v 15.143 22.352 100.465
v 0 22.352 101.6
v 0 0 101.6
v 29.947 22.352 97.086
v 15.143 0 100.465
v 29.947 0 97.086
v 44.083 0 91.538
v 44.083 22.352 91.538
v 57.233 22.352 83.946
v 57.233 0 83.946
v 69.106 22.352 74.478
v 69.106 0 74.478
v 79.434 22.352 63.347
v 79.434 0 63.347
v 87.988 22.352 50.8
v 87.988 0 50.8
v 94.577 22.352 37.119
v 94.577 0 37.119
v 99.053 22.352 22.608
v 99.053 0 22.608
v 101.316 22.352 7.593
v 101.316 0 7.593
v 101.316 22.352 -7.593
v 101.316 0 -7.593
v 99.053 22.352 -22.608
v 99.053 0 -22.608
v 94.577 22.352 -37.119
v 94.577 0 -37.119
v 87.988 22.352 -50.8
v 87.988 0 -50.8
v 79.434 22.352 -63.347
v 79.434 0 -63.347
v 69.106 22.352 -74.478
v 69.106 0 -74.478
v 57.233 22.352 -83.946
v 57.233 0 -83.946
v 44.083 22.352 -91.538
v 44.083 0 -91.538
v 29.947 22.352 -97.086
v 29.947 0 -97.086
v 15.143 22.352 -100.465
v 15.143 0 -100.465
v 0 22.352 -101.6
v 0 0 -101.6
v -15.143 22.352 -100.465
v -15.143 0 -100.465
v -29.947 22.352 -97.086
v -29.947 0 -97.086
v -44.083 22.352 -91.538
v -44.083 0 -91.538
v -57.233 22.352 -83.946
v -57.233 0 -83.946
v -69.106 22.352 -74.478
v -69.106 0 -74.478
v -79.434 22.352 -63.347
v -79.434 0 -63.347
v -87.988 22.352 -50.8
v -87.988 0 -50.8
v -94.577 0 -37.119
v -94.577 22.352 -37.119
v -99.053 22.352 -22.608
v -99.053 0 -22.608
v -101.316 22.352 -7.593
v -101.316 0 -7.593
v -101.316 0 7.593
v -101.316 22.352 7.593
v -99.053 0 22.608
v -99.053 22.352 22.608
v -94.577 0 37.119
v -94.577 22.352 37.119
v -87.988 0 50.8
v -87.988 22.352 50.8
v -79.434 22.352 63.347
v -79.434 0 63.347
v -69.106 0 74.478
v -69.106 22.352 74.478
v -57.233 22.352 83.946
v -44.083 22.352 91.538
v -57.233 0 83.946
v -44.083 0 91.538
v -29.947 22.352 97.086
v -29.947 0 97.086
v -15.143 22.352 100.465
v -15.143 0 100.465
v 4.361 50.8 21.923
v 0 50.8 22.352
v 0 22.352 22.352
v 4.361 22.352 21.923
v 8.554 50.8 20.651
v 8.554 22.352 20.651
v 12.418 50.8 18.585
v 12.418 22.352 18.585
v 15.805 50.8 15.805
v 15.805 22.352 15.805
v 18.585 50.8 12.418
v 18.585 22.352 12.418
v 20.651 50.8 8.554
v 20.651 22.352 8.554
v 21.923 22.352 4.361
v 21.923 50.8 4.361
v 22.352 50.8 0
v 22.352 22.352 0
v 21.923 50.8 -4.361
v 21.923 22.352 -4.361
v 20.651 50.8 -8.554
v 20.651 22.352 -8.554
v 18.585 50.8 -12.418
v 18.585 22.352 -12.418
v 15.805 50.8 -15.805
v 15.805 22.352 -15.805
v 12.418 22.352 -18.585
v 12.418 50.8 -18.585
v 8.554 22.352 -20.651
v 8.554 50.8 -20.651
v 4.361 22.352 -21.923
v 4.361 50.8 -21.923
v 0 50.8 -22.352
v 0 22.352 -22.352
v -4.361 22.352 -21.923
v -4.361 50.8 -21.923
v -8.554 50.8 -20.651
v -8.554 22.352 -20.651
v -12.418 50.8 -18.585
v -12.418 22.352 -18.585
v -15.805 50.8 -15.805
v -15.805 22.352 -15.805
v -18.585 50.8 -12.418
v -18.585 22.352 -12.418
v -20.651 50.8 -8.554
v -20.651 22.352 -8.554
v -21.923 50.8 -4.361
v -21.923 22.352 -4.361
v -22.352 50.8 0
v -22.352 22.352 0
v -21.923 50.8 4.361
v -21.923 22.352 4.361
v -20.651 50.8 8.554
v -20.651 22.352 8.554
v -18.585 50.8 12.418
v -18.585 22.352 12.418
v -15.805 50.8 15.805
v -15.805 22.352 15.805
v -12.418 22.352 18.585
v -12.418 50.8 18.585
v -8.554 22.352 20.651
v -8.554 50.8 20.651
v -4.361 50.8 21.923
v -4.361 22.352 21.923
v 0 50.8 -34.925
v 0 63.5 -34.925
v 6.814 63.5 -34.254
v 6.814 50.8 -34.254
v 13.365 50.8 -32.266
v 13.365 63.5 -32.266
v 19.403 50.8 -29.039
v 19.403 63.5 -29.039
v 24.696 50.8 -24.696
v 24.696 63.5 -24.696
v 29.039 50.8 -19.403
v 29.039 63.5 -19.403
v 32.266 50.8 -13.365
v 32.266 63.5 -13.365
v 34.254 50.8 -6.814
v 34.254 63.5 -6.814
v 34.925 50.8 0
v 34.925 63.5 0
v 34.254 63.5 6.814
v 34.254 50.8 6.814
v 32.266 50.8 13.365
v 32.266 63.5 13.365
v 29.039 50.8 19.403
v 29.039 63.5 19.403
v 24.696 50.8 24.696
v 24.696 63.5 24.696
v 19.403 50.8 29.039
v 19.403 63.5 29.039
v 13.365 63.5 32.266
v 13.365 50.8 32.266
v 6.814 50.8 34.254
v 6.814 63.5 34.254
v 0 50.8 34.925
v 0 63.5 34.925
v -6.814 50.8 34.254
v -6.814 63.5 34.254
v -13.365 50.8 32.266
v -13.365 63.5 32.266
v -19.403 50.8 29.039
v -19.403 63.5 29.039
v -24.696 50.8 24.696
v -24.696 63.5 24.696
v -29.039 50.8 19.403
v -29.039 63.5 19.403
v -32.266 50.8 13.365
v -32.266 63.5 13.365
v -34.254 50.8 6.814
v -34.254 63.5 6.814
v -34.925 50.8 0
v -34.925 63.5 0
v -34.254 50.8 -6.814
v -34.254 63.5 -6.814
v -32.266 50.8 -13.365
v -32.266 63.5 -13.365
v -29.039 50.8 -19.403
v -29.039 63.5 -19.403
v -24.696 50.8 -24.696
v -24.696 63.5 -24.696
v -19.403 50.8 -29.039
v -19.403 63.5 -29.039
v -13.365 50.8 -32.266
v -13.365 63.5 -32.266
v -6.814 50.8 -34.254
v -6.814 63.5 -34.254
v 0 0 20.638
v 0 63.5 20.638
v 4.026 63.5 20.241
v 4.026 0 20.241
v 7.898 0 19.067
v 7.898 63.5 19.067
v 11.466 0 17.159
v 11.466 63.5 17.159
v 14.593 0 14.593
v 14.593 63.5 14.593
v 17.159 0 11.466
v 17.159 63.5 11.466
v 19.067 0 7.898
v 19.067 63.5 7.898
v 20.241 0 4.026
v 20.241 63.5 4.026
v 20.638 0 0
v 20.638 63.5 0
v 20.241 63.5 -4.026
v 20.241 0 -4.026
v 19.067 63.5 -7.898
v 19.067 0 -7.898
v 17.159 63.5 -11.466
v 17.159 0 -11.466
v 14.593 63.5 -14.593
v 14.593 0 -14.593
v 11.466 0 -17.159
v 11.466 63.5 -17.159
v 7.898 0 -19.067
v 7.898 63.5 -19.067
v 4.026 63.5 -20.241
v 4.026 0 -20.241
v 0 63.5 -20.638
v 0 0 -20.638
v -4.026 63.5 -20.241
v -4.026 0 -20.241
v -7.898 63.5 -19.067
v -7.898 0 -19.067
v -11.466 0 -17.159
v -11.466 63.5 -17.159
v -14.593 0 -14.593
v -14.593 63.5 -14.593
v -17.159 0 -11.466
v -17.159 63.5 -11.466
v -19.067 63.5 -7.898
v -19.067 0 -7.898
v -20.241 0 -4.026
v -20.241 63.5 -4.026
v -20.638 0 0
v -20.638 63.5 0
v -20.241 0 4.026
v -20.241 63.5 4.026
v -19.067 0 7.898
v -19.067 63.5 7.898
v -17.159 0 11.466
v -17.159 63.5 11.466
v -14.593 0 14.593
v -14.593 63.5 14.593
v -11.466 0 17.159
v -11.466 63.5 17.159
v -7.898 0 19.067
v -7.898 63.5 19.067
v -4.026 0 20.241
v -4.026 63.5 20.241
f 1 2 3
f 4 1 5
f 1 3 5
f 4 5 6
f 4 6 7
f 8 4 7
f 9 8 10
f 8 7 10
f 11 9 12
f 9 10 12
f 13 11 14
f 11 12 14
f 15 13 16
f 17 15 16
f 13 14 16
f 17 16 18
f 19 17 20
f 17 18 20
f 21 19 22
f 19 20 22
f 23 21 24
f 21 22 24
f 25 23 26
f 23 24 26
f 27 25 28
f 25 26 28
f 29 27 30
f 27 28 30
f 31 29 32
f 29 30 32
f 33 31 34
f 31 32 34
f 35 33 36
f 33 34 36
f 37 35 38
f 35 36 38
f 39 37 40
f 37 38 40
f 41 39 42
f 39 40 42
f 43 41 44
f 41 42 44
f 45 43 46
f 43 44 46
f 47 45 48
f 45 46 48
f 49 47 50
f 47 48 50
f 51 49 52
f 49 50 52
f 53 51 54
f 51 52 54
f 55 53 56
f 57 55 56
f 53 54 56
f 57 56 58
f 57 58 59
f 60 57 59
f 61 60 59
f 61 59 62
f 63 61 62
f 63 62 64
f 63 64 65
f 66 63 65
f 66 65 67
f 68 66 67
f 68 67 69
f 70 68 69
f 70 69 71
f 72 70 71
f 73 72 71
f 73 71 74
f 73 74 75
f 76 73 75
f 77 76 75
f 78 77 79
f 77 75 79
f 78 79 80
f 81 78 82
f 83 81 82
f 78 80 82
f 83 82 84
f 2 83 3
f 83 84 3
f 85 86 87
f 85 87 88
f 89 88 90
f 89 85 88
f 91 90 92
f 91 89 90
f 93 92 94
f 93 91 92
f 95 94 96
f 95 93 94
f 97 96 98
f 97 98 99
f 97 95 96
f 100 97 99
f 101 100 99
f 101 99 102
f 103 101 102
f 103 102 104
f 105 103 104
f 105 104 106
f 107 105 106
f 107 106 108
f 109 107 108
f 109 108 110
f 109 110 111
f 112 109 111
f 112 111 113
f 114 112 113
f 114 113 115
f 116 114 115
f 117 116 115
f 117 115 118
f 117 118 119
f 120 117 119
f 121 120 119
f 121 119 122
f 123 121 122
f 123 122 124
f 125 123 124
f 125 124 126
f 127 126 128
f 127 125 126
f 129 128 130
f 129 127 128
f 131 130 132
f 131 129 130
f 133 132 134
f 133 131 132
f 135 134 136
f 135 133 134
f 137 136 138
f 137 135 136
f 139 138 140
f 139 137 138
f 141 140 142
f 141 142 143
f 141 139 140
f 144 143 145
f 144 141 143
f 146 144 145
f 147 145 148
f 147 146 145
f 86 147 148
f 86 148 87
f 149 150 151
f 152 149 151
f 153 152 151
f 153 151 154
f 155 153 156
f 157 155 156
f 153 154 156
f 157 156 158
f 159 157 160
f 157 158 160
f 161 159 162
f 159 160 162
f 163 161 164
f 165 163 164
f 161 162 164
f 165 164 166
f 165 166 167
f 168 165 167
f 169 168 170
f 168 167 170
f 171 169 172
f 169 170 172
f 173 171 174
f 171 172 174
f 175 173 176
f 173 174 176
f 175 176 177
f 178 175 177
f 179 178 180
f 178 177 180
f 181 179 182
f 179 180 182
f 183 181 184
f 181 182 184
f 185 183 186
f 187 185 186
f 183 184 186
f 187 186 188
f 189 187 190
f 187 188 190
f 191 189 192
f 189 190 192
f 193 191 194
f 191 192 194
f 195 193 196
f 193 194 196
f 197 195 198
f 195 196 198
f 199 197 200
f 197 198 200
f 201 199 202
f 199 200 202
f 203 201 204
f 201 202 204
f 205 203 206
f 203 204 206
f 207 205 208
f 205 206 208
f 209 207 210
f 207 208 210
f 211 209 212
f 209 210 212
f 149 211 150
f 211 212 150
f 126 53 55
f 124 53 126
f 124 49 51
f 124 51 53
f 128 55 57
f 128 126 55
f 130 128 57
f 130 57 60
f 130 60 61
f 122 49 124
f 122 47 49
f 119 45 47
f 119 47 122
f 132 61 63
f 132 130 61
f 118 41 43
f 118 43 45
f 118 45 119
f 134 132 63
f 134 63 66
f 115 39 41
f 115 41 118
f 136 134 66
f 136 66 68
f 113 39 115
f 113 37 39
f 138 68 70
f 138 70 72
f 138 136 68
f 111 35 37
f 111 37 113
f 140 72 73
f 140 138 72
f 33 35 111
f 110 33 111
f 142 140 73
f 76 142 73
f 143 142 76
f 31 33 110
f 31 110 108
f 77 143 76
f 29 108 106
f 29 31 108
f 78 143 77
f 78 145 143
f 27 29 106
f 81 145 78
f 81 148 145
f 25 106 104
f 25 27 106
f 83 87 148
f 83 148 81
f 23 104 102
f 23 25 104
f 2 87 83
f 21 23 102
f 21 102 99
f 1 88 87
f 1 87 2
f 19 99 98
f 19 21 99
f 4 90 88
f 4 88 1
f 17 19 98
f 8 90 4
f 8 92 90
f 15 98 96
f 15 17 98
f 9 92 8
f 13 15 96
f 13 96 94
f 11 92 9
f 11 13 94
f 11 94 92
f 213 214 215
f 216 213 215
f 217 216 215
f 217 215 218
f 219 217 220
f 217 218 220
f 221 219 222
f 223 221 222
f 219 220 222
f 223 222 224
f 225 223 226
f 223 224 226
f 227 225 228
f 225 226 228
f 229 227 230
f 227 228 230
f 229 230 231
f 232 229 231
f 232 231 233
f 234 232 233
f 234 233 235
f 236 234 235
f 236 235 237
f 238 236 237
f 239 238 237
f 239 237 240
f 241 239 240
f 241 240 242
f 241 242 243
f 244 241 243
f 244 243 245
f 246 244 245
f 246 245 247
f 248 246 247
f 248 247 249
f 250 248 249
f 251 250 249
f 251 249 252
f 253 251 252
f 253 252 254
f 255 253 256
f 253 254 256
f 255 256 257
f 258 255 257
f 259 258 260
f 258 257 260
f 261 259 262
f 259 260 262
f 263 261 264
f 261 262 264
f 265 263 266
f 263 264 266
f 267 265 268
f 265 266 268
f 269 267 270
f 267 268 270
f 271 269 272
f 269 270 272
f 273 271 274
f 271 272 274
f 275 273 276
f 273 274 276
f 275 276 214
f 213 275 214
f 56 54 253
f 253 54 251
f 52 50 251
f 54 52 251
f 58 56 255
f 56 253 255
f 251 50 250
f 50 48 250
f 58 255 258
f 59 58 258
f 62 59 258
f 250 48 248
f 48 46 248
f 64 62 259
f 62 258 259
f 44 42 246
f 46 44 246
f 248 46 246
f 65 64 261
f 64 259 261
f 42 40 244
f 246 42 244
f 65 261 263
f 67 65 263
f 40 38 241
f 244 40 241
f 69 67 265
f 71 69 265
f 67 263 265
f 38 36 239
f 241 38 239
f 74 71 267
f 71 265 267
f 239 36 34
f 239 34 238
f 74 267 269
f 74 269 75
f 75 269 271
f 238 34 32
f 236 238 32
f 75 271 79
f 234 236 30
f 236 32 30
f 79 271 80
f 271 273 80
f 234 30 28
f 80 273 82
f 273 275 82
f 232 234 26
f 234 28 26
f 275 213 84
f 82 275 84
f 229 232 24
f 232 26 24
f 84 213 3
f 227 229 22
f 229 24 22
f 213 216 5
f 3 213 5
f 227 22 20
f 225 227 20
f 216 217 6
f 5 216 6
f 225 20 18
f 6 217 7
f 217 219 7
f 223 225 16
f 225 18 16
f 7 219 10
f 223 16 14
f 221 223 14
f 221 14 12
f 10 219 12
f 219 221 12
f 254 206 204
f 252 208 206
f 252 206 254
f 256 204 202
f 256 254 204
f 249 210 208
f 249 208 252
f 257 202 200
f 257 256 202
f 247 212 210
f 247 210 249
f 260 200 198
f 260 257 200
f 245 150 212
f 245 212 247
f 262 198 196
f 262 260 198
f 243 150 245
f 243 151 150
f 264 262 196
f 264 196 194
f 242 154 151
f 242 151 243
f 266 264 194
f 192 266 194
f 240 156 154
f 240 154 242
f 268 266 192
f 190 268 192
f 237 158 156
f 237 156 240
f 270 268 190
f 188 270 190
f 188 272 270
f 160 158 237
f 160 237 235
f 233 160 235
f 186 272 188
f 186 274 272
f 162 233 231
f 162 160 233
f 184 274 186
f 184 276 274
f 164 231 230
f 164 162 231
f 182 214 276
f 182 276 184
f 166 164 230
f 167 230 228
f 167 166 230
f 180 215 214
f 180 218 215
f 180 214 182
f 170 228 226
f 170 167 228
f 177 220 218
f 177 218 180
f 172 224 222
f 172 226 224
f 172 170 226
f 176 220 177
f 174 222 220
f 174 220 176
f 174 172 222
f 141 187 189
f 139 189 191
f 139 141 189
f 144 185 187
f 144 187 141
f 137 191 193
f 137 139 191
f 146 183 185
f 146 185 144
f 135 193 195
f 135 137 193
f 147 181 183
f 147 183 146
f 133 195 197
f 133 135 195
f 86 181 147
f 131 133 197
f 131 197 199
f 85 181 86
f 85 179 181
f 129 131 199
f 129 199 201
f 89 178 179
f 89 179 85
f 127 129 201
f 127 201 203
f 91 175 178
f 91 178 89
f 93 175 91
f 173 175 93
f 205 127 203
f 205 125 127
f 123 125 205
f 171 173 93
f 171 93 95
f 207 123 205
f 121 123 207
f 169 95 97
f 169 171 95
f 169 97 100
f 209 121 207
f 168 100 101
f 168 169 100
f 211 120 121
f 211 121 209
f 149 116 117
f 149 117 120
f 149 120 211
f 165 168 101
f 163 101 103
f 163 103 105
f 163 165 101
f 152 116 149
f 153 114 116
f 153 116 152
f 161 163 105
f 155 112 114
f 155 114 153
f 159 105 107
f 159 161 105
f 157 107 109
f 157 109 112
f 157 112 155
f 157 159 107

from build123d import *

# Parameters (mm, degrees)
SKETCH1_R           = 101.6
BOSS_EXTRUDE1_DEPTH = 22.352
SKETCH2_R           = 34.925
BOSS_EXTRUDE2_DEPTH = 12.7
SKETCH3_R           = 22.352
BOSS_EXTRUDE3_DEPTH = 41.148
SKETCH4_R           = 20.6375
CUT_EXTRUDE1_DEPTH  = 158.090324336


with BuildPart() as part:
    # Sketch1 → Boss-Extrude1 (new body)
    with BuildSketch(Plane(origin=(0, 0, 0), x_dir=(1, 0, 0), z_dir=(0, 1, 0))):
        with Locations(Location((0, 0, 0), (0, 0, 270))):
            Circle(SKETCH1_R)
    extrude(amount=BOSS_EXTRUDE1_DEPTH)



with BuildPart() as body_2:
    # Sketch2 → Boss-Extrude2 (new body)
    with BuildSketch(Plane.XZ.offset(-63.5)):
        with Locations(Location((0, 0, 0), (0, 0, 270))):
            Circle(SKETCH2_R)
    extrude(amount=BOSS_EXTRUDE2_DEPTH)


with BuildPart() as part_1:
    add(part.part)

    add(body_2.part)  # Boss-Extrude3 merges body 2
    # Sketch3 → Boss-Extrude3 (add)
    with BuildSketch(Plane(origin=(0, 63.5, 0), x_dir=(1, 0, 0), z_dir=(0, 1, 0))):
        with Locations(Location((0, 0, 0), (0, 0, 270))):
            Circle(SKETCH3_R)
    extrude(amount=-BOSS_EXTRUDE3_DEPTH)

    # Sketch4 → Cut-Extrude1 (cut, through all)
    with BuildSketch(Plane(origin=(0, 63.5, 0), x_dir=(1, 0, 0), z_dir=(0, 1, 0))):
        with Locations(Location((0, 0, 0), (0, 0, 270))):
            Circle(SKETCH4_R)
    extrude(amount=-CUT_EXTRUDE1_DEPTH, mode=Mode.SUBTRACT)


solid = part_1.part
